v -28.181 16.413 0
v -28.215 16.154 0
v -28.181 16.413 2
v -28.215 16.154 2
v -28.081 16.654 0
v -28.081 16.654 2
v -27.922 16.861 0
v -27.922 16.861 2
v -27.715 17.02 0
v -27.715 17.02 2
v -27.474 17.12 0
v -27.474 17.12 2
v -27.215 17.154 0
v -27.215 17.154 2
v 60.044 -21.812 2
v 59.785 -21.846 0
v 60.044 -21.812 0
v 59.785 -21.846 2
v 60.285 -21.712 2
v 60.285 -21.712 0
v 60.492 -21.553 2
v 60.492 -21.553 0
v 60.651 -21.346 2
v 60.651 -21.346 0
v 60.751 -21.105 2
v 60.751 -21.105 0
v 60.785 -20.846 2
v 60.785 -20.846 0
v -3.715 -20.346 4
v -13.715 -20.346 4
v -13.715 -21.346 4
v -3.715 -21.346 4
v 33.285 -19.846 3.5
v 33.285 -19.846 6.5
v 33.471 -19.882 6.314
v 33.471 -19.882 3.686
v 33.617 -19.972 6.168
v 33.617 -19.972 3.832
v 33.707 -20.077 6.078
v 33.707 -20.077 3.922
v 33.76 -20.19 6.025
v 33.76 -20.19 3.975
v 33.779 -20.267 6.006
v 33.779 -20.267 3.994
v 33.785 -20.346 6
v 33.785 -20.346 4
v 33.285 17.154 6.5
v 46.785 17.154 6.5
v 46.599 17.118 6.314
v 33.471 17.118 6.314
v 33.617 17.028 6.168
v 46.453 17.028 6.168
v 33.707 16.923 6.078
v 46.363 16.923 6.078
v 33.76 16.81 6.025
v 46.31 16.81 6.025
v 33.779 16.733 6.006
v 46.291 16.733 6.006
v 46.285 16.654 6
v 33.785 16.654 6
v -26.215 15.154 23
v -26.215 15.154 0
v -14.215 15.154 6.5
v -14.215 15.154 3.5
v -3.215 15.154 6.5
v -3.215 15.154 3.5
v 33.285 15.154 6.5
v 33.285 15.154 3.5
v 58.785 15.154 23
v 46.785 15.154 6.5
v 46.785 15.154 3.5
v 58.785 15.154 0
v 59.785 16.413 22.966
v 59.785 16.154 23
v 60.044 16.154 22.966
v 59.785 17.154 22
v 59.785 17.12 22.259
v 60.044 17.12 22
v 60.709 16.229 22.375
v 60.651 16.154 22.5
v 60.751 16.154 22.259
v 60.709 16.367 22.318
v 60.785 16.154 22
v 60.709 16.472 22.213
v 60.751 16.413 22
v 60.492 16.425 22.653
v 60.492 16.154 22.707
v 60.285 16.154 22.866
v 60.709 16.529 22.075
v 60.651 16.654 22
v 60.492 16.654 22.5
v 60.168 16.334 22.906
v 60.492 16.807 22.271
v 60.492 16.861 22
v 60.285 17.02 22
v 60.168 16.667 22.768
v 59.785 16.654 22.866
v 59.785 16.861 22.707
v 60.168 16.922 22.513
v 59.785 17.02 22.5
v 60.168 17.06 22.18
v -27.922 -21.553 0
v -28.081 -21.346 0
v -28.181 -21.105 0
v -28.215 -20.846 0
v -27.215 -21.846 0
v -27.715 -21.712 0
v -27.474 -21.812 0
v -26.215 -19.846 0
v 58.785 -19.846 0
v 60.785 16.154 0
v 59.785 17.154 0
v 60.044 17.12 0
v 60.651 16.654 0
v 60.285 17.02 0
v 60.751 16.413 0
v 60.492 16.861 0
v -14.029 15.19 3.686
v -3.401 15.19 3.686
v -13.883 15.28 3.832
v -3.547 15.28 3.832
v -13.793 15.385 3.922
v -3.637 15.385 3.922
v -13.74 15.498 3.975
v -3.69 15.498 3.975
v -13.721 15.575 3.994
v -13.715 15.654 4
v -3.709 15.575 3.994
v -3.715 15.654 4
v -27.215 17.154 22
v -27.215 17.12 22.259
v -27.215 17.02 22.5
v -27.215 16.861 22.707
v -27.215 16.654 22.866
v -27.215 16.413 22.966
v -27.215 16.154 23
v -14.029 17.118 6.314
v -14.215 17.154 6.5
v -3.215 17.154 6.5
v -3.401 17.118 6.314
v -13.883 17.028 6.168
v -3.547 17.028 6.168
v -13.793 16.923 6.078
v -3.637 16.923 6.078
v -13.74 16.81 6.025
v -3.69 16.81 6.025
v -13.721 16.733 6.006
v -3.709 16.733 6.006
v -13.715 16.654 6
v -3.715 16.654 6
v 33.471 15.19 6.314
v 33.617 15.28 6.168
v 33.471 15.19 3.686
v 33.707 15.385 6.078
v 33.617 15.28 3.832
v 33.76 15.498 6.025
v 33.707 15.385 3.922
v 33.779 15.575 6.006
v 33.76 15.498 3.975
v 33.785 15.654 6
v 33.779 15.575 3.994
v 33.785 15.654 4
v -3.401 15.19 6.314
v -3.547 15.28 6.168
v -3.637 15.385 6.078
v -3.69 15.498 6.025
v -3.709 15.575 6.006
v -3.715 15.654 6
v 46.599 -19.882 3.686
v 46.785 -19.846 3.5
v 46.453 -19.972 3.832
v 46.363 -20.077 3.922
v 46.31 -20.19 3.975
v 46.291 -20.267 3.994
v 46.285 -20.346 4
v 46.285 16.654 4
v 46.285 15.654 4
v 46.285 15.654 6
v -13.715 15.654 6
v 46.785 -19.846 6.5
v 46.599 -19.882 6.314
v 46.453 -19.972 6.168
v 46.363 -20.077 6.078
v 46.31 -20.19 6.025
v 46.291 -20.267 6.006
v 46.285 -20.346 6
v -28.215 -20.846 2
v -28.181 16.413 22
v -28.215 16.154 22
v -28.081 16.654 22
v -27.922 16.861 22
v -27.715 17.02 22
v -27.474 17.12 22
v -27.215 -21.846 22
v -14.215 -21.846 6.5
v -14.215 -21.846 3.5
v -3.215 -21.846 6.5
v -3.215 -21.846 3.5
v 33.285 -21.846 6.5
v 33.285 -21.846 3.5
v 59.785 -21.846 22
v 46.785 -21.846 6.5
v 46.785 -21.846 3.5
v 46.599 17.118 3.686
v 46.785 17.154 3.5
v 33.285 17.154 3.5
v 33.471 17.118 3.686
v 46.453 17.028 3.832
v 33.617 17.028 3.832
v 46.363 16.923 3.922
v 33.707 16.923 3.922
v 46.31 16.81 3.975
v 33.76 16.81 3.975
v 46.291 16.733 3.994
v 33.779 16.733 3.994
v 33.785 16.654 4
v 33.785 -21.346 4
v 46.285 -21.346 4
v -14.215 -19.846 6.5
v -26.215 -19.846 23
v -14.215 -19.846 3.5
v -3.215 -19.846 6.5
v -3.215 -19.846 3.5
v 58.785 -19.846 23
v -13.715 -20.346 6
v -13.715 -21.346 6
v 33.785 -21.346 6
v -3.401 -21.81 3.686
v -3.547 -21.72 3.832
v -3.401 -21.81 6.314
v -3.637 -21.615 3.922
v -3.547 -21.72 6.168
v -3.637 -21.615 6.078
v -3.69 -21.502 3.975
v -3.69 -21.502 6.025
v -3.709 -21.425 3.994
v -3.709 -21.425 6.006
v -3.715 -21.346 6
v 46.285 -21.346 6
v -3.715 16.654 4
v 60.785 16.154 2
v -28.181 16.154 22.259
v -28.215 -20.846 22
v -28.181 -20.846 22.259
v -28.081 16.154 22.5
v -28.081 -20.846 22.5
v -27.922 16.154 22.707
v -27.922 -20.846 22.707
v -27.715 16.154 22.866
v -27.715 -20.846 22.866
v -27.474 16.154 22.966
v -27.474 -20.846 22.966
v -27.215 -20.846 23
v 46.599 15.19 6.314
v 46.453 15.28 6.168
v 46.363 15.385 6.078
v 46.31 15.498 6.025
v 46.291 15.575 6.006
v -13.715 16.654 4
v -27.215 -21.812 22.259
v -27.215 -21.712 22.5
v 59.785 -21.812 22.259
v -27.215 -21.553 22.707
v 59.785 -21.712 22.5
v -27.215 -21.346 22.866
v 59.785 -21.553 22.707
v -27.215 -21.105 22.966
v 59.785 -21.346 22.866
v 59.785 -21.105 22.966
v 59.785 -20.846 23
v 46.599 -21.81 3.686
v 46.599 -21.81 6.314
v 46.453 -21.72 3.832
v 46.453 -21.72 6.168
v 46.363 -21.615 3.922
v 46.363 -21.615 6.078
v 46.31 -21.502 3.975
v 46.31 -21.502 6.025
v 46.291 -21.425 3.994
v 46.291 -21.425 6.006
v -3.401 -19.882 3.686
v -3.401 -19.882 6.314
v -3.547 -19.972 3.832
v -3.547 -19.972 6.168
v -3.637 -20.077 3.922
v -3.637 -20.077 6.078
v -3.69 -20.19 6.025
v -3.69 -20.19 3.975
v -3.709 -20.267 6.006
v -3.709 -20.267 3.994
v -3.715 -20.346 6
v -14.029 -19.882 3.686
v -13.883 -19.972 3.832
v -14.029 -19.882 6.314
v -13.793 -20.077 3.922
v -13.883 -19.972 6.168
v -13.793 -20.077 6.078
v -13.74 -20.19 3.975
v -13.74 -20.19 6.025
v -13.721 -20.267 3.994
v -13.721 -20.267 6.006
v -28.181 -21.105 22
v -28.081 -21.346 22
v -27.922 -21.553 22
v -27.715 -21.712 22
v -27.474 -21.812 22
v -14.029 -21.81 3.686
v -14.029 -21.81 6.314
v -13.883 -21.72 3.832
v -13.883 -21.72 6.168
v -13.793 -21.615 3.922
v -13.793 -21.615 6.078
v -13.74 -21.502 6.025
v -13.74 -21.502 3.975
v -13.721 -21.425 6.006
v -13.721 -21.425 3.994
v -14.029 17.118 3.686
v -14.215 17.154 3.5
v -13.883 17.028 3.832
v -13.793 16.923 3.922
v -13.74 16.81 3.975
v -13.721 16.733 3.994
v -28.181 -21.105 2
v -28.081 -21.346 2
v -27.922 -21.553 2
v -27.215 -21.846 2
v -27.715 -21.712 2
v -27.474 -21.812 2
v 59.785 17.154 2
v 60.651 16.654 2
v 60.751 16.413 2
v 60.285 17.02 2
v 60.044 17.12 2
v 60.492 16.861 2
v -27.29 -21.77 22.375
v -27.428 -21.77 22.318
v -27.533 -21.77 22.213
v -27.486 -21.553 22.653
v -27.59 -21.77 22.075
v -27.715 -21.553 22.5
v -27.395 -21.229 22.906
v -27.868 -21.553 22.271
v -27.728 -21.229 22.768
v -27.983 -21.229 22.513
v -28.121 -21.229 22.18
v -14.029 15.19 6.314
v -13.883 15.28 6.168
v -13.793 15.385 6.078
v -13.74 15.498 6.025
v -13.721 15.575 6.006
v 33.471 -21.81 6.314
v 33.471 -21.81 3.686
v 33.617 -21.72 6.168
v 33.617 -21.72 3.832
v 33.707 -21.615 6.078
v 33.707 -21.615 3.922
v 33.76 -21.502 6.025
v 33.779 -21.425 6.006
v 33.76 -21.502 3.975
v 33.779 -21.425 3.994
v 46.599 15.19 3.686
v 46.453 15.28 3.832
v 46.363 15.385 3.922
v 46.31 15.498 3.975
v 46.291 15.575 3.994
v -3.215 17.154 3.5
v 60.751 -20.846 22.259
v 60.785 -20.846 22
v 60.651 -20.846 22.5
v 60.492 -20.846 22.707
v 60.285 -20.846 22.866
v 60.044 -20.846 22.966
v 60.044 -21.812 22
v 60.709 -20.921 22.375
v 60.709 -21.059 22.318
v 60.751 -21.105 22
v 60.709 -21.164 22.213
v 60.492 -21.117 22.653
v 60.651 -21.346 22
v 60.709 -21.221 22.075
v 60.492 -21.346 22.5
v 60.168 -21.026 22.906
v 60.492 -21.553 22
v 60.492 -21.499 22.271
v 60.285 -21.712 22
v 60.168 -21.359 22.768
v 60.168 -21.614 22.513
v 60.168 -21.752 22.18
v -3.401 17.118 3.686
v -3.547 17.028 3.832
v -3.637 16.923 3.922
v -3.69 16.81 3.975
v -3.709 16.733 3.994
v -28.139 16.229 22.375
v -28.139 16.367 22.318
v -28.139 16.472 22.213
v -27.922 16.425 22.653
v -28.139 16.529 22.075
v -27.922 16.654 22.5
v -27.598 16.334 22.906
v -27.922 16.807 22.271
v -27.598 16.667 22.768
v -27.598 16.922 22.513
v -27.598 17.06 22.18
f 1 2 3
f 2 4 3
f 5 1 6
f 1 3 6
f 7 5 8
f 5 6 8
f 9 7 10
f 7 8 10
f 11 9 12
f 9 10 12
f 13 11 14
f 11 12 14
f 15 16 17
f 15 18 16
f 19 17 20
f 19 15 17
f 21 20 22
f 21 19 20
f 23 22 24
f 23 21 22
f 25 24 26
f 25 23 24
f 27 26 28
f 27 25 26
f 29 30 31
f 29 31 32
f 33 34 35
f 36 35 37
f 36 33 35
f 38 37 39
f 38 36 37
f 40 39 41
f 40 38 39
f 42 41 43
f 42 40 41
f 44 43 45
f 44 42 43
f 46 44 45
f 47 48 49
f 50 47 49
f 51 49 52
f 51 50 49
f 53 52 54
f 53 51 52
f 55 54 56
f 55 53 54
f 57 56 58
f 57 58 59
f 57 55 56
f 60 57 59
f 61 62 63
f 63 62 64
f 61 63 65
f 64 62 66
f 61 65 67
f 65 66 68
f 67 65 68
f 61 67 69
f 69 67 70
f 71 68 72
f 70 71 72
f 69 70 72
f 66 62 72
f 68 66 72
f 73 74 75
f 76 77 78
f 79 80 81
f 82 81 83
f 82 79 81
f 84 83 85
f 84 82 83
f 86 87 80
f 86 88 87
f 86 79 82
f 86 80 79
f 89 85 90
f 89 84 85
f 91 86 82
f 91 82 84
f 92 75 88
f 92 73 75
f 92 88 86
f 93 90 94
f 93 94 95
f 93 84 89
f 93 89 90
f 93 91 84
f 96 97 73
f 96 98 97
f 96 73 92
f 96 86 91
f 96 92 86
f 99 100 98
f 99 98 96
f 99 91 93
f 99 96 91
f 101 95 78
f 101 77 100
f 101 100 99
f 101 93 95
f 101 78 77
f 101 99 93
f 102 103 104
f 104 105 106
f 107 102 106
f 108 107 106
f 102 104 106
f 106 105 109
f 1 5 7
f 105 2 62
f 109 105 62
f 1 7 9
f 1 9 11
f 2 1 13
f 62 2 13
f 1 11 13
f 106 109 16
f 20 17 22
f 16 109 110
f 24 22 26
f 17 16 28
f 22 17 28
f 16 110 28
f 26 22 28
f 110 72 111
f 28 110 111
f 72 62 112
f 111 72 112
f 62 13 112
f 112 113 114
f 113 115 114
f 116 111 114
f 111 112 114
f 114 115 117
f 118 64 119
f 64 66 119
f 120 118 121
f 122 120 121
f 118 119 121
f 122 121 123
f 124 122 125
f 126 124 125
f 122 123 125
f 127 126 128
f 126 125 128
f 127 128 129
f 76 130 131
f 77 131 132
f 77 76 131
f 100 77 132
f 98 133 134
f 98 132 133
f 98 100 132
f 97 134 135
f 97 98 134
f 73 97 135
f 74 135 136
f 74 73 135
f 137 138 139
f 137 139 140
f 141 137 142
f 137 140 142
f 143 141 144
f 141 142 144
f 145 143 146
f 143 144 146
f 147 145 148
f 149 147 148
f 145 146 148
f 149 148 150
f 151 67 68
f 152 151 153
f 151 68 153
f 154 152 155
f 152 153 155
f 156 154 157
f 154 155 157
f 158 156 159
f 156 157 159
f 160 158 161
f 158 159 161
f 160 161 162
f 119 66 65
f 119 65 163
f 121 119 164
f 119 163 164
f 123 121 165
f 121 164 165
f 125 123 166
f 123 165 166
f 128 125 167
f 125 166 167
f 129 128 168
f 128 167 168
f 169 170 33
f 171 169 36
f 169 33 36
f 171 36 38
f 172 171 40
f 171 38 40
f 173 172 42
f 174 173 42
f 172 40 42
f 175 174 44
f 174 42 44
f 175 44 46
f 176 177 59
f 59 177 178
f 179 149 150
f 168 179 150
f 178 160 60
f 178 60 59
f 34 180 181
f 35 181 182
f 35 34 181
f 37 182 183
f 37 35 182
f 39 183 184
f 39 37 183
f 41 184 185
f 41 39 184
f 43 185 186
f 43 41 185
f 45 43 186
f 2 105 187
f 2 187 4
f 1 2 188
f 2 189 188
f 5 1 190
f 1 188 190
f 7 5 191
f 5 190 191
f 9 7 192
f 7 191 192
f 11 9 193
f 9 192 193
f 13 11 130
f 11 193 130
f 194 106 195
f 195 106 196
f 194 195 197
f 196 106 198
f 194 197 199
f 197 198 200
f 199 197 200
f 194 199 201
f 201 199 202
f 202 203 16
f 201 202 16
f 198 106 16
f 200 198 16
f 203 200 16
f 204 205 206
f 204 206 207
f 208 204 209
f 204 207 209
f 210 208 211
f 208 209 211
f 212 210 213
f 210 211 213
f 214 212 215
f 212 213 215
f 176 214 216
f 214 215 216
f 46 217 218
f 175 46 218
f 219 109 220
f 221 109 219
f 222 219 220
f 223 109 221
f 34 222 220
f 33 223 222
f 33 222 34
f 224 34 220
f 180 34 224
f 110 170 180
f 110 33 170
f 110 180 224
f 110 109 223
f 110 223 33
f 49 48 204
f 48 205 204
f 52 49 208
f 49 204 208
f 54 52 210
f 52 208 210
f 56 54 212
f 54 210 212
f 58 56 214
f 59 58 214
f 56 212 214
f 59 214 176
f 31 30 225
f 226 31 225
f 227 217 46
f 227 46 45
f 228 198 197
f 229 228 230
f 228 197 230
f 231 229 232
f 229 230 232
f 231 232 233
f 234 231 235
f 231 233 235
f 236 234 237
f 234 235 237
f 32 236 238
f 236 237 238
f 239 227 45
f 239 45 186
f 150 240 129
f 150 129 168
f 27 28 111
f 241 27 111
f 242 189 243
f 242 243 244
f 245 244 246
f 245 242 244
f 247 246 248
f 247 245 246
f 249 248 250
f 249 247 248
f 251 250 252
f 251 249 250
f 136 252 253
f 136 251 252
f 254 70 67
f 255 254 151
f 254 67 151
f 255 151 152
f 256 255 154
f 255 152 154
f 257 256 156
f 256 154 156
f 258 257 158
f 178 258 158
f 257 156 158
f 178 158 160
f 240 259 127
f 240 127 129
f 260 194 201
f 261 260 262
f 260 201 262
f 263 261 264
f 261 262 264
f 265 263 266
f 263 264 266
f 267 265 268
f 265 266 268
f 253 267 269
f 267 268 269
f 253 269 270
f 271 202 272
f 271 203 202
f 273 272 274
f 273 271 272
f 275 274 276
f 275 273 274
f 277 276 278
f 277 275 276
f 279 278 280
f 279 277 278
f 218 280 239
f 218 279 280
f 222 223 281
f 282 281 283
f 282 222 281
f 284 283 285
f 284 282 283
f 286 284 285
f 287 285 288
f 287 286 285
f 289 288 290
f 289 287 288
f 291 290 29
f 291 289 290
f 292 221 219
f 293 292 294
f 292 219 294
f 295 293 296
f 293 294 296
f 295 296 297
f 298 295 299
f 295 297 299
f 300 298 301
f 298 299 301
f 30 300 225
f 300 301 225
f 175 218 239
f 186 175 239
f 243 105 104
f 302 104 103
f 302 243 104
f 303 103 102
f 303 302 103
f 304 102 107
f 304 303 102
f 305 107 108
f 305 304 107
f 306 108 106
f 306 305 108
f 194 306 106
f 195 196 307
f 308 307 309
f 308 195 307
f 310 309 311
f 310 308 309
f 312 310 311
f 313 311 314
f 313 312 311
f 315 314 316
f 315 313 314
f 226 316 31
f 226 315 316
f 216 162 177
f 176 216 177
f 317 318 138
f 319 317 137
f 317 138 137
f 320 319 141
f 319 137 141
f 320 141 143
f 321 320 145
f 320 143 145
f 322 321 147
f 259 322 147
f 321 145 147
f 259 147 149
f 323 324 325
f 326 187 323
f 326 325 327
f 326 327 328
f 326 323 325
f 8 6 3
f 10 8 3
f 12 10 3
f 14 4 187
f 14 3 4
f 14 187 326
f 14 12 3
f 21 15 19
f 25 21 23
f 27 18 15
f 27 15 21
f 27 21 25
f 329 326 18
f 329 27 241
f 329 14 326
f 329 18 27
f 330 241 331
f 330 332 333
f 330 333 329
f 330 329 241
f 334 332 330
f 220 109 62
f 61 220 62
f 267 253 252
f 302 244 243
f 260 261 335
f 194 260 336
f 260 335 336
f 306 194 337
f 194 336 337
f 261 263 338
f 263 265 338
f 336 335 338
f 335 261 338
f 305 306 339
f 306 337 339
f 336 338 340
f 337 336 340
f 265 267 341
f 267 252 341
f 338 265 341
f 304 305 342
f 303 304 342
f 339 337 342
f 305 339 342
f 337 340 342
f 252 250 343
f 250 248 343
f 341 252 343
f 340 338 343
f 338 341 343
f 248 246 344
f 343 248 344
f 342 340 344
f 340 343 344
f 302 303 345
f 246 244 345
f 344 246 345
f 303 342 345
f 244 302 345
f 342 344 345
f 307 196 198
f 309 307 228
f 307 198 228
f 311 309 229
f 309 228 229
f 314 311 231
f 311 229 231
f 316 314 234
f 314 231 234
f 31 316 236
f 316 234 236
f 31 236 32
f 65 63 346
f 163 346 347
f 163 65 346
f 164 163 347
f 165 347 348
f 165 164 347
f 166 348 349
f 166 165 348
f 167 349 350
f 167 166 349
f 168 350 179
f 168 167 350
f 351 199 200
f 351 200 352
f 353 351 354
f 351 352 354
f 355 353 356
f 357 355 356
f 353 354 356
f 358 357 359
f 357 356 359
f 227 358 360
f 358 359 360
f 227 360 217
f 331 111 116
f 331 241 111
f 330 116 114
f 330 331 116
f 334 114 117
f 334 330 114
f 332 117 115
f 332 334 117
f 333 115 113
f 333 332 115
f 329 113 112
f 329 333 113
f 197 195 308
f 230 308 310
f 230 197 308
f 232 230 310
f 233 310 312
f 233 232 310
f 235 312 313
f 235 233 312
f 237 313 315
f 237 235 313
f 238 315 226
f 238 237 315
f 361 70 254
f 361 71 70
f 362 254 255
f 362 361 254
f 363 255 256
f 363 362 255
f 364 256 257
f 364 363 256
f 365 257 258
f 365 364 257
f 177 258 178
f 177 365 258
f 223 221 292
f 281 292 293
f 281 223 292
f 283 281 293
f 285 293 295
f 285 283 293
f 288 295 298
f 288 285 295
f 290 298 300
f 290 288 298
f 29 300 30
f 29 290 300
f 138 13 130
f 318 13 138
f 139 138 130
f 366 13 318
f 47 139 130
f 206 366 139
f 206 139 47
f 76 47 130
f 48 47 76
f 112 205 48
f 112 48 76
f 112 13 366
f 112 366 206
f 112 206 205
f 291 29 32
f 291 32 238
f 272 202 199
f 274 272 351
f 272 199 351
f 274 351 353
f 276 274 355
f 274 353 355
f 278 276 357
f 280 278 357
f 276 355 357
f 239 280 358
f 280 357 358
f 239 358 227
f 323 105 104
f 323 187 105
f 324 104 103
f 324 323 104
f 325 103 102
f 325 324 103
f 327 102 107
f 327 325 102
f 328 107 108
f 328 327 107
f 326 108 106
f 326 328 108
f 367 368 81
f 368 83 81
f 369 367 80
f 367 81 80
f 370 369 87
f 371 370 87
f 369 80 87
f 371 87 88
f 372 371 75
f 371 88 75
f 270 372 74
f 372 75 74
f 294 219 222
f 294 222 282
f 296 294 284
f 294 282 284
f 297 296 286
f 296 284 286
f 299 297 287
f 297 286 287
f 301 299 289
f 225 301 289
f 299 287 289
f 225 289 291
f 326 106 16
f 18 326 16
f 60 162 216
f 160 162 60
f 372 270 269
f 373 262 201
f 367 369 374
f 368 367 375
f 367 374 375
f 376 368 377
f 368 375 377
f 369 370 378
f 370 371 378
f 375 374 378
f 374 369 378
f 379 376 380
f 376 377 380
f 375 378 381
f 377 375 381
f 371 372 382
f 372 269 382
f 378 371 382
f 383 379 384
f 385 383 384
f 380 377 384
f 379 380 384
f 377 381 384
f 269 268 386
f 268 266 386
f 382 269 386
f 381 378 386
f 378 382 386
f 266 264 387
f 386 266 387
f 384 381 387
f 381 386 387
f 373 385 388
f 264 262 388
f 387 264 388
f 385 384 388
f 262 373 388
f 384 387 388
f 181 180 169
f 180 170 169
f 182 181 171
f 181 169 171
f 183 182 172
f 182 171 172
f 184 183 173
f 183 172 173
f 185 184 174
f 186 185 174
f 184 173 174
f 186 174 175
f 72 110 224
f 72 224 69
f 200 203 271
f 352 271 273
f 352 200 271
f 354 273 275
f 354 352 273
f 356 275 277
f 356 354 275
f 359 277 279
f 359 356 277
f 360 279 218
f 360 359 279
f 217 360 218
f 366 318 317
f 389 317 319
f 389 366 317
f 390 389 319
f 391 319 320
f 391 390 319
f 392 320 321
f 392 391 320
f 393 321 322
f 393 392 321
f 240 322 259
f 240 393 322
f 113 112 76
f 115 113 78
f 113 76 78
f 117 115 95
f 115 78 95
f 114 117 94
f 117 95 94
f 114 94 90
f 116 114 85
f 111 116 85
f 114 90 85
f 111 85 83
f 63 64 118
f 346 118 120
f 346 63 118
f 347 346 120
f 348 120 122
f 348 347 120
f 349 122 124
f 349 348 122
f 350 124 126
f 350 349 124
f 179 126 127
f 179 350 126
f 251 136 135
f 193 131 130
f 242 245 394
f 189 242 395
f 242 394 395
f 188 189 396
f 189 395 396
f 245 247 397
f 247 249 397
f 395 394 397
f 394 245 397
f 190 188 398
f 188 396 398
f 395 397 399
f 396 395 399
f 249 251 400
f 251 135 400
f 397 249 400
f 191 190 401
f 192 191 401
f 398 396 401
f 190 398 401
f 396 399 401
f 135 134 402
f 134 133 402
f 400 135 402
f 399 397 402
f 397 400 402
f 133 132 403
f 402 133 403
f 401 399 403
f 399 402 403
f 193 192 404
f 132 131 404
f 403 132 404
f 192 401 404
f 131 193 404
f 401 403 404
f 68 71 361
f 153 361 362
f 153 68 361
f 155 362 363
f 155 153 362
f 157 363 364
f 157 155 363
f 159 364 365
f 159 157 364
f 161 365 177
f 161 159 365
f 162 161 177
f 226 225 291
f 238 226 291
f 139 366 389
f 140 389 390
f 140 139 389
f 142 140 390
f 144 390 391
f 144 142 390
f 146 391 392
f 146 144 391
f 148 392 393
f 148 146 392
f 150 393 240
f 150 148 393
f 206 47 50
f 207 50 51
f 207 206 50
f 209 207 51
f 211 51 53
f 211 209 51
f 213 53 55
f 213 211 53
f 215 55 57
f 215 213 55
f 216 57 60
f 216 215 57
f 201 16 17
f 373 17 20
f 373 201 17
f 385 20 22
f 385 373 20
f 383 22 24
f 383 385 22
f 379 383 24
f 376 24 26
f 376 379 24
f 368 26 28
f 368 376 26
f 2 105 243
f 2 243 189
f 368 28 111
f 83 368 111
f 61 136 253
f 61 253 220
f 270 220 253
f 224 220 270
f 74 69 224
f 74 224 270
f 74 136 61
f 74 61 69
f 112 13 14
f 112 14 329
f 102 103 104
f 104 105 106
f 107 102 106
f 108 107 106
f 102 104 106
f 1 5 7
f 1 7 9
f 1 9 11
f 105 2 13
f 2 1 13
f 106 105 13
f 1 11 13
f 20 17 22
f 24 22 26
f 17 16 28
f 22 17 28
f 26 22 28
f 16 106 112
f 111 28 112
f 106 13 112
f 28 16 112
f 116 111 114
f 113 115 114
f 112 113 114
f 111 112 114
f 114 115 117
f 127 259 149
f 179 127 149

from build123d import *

# Parameters (mm, degrees)
F0_W     = 89
F0_H     = 39
F0_W_2   = 85
F0_H_2   = 35
F1_DEPTH = 23
F2_W     = 89
F2_H     = 39
F3_DEPTH = 2
F4_R     = 1
F5_R     = 1
F6_W     = 10
F6_H     = 2
F6_W_2   = 12.5
F7_DEPTH = 50
F8_R     = 0.5


with BuildPart() as f1:
    # F0 (on Top) → F1 (new body)
    with BuildSketch(Plane.XY):
        with Locations((16.2850007862, -2.3460731005)):
            Rectangle(F0_W, F0_H)
        with Locations((16.2850007862, -2.3460731005)):
            Rectangle(F0_W_2, F0_H_2, mode=Mode.SUBTRACT)
    extrude(amount=F1_DEPTH)

    # F4
    f4_edges = [f1.edges().sort_by_distance(p)[0] for p in [
        (16.285001, 17.153927, 23),
        (-28.214999, -2.346073, 23),
        (16.285001, -21.846073, 23),
        (60.785001, -2.346073, 23),
        (60.785001, 17.153927, 11.5),
        (60.785001, -21.846073, 11.5),
        (-28.214999, 17.153927, 11.5),
        (-28.214999, -21.846073, 11.5),
    ]]
    fillet(f4_edges, radius=F4_R)

    # F6 (on Front) → F7 (cut, symmetric)
    with BuildSketch(Plane.XZ):
        with Locations((-8.7149992138, 5)):
            Rectangle(F6_W, F6_H)
        with Locations((40.0350007862, 5)):
            Rectangle(F6_W_2, F6_H)
    extrude(amount=F7_DEPTH, both=True, mode=Mode.SUBTRACT)

    # F8
    f8_edges = [f1.edges().sort_by_distance(p)[0] for p in [
        (-13.714999, -21.846073, 5),
        (-8.714999, -21.846073, 6),
        (-8.714999, -21.846073, 4),
        (-3.714999, -21.846073, 5),
        (40.035001, -21.846073, 6),
        (33.785001, -21.846073, 5),
        (40.035001, -21.846073, 4),
        (46.285001, -21.846073, 5),
        (-8.714999, 15.153927, 6),
        (-8.714999, 15.153927, 4),
        (-13.714999, 15.153927, 5),
        (-3.714999, 15.153927, 5),
        (33.785001, 15.153927, 5),
        (40.035001, 15.153927, 6),
        (40.035001, 15.153927, 4),
        (46.285001, 15.153927, 5),
        (46.285001, 17.153927, 5),
        (40.035001, 17.153927, 6),
        (33.785001, 17.153927, 5),
        (40.035001, 17.153927, 4),
        (-13.714999, 17.153927, 5),
        (-8.714999, 17.153927, 4),
        (-3.714999, 17.153927, 5),
        (-8.714999, 17.153927, 6),
        (-3.714999, -19.846073, 5),
        (-8.714999, -19.846073, 4),
        (-13.714999, -19.846073, 5),
        (-8.714999, -19.846073, 6),
        (46.285001, -19.846073, 5),
        (40.035001, -19.846073, 4),
        (33.785001, -19.846073, 5),
        (40.035001, -19.846073, 6),
    ]]
    fillet(f8_edges, radius=F8_R)


with BuildPart() as f3:
    # F2 (on Top) → F3 (new body)
    with BuildSketch(Plane.XY):
        with Locations((16.2850007862, -2.3460731005)):
            Rectangle(F2_W, F2_H)
    extrude(amount=F3_DEPTH)

    # F5
    f5_edges = [f3.edges().sort_by_distance(p)[0] for p in [
        (60.785001, 17.153927, 1),
        (-28.214999, 17.153927, 1),
        (-28.214999, -21.846073, 1),
        (60.785001, -21.846073, 1),
    ]]
    fillet(f5_edges, radius=F5_R)


solid = Compound([f1.part, f3.part])
